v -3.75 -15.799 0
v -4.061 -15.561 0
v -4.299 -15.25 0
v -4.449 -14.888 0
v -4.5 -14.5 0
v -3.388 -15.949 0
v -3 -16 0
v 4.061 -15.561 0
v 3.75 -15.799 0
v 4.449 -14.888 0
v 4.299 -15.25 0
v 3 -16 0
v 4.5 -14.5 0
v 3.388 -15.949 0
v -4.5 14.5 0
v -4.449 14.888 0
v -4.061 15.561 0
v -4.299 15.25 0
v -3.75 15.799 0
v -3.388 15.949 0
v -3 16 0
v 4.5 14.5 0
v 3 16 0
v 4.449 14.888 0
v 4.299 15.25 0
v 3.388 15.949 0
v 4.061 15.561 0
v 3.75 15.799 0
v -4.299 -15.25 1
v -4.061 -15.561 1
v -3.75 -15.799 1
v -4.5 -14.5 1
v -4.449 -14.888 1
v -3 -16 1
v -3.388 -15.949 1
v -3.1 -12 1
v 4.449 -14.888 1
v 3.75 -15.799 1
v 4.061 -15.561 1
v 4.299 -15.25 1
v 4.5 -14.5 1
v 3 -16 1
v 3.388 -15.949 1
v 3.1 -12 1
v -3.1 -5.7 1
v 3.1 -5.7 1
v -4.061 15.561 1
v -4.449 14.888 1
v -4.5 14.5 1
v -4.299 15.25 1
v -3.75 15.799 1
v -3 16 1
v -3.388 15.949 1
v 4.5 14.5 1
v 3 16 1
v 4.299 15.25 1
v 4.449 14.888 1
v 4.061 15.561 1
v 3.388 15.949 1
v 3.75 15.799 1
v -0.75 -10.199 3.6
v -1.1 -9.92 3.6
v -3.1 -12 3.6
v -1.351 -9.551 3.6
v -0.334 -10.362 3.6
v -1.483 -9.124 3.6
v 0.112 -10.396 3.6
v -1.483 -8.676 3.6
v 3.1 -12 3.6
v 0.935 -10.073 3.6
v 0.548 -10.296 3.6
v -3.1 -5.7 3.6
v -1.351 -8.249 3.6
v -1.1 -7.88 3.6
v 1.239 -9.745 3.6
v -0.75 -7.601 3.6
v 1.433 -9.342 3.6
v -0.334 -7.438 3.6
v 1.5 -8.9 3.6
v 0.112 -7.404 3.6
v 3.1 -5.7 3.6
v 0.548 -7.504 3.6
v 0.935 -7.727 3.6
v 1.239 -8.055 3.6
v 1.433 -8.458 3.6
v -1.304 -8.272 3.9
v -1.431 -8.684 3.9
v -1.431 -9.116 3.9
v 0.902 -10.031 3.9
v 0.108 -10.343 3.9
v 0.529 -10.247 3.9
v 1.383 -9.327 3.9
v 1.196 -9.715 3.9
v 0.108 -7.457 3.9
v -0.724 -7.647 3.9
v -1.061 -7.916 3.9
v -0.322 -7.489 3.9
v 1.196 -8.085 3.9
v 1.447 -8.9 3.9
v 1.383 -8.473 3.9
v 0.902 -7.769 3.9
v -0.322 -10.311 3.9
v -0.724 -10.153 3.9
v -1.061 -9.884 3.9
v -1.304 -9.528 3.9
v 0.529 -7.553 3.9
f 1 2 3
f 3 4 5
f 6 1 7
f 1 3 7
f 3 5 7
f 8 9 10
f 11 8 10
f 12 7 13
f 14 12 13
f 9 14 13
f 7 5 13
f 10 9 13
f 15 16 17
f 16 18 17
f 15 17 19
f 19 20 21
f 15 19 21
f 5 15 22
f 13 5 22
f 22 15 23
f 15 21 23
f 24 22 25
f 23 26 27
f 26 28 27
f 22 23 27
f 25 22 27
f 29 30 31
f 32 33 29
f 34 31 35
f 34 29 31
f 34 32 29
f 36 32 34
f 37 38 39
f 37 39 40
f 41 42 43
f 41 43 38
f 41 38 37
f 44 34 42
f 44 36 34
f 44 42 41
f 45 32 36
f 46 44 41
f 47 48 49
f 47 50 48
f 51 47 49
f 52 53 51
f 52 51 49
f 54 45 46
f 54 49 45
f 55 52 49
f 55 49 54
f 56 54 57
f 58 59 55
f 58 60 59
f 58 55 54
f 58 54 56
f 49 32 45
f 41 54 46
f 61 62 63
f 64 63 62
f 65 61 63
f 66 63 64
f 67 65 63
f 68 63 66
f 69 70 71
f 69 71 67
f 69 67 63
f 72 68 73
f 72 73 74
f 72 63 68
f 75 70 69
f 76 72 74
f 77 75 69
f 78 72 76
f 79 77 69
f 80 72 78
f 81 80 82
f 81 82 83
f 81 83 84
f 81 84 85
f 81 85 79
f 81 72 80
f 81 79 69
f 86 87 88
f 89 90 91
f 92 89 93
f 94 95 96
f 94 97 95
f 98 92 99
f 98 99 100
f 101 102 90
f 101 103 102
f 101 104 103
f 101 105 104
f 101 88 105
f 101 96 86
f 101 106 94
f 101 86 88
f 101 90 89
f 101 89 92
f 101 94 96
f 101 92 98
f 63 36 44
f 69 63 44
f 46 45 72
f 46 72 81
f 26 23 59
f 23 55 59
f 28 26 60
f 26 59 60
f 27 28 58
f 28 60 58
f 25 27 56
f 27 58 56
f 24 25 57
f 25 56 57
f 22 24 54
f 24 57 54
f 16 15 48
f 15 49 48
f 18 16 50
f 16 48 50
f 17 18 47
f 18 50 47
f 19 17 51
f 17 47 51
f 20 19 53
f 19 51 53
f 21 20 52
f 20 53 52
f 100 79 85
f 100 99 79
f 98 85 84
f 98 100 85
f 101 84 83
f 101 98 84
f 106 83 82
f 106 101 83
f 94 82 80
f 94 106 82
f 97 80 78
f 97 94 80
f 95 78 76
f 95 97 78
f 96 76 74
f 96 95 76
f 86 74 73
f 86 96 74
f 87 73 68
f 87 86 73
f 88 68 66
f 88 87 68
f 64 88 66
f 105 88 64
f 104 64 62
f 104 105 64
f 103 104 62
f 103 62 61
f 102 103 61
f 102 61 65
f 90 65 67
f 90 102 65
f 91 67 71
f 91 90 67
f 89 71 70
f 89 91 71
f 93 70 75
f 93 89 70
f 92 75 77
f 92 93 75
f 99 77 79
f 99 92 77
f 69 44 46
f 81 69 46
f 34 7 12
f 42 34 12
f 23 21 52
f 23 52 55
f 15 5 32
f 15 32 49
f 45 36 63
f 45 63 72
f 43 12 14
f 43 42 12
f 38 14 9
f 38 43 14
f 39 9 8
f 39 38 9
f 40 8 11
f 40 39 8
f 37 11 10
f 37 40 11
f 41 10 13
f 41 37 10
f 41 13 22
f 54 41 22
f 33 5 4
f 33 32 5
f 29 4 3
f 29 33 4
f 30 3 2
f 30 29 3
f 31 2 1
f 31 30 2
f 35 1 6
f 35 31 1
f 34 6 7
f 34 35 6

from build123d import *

# Parameters (mm, degrees)
F0_W     = 9
F0_H     = 32
F1_DEPTH = 1
F2_W     = 6.2
F2_H     = 6.3
F3_DEPTH = 2.6
F4_R     = 1.5
F5_DEPTH = 0.3
F5_TAPER = 10
F6_R     = 1.5


with BuildPart() as f1:
    # F0 (on Top) → F1 (new body)
    with BuildSketch(Plane.XY):
        Rectangle(F0_W, F0_H)
    extrude(amount=F1_DEPTH)

    # F2 (on face) → F3 (join)
    with BuildSketch(Plane.XY.offset(1)):
        with Locations((0, -8.85)):
            Rectangle(F2_W, F2_H)
    extrude(amount=F3_DEPTH)

    # F4 (on face) → F5 (join)
    with BuildSketch(Plane.XY.offset(3.6)):
        with Locations((0, -8.9)):
            Circle(F4_R)
    extrude(amount=F5_DEPTH, taper=F5_TAPER)

    # F6
    f6_edges = [f1.edges().sort_by_distance(p)[0] for p in [
        (4.5, -16, 0.5),
        (-4.5, -16, 0.5),
        (4.5, 16, 0.5),
        (-4.5, 16, 0.5),
    ]]
    fillet(f6_edges, radius=F6_R)


solid = f1.part
